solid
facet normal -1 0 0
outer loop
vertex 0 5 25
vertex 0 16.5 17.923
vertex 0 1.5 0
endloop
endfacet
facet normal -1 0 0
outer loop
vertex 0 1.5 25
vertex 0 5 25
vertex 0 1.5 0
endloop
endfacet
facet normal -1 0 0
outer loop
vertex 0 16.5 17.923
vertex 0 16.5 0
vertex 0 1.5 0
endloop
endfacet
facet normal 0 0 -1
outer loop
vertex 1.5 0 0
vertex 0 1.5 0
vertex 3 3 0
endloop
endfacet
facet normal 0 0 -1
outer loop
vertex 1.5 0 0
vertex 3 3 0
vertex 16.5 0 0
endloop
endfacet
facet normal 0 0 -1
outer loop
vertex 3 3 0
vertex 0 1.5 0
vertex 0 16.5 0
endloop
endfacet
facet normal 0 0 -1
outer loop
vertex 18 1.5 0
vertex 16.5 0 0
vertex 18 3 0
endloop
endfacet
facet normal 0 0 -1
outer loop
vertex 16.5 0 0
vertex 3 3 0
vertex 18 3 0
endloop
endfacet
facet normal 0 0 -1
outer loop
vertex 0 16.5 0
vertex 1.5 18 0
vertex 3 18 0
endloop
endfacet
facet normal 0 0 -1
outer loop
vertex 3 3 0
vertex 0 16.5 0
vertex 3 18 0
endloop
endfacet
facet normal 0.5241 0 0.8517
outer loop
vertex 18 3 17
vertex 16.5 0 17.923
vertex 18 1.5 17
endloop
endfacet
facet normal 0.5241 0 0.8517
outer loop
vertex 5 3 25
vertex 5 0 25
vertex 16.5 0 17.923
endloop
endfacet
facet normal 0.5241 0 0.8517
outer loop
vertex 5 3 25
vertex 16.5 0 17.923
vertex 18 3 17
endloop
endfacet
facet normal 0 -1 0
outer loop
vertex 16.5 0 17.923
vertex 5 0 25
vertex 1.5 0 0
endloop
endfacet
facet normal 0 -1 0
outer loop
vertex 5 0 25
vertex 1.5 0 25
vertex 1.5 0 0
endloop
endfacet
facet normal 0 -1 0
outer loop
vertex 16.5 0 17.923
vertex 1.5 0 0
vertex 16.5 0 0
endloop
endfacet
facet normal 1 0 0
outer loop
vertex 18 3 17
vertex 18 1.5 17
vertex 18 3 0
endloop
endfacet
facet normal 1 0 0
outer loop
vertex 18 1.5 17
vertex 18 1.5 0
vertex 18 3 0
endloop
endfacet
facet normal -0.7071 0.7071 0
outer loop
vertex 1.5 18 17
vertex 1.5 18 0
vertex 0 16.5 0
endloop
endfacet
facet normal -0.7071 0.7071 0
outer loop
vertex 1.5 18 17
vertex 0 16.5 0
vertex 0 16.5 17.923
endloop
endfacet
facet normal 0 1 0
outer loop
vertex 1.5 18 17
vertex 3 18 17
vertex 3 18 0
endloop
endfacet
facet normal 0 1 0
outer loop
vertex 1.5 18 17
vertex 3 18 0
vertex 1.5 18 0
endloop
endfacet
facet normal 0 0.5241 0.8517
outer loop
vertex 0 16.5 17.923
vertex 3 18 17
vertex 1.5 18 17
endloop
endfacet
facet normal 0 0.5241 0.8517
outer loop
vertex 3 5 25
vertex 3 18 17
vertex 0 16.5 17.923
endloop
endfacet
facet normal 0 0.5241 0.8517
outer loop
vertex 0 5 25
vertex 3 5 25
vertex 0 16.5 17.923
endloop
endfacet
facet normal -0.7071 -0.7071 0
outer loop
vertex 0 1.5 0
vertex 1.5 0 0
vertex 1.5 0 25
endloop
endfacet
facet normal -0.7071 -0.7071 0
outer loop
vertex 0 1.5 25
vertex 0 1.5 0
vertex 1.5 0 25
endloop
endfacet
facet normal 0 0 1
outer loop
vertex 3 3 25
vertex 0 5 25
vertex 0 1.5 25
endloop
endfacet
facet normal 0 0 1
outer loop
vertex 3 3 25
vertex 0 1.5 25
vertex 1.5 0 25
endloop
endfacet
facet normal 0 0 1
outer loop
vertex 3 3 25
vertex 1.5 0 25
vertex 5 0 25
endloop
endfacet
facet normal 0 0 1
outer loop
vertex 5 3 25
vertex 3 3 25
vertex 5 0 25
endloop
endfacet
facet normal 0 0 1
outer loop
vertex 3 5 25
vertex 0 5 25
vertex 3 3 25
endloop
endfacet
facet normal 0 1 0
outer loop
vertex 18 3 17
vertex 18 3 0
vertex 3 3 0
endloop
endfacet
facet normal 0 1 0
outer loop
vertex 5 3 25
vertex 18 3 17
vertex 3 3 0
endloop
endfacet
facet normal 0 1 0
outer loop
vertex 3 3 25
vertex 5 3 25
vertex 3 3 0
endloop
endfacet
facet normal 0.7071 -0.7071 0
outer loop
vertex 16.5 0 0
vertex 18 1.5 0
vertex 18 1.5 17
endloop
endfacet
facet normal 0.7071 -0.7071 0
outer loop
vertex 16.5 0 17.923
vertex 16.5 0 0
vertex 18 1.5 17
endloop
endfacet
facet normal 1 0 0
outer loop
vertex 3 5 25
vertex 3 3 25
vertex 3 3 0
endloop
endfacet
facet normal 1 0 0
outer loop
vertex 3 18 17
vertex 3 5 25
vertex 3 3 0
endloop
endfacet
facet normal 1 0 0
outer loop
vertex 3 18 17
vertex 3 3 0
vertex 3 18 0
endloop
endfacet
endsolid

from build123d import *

# Parameters (mm, degrees)
F1_DEPTH = 25
F2_SIZE2 = 13
F2_SIZE  = 8
F3_SIZE  = 1.5


with BuildPart() as f1:
    # F0 (on Top) → F1 (new body)
    with BuildSketch(Plane.XY):
        Polygon((0, 18), (0, 0), (18, 0), (18, 3), (3, 3), (3, 18), align=None)
    extrude(amount=F1_DEPTH)

    # F2
    f2_edges = [f1.edges().sort_by_distance(p)[0] for p in [
        (1.5, 18, 25),
        (18, 1.5, 25),
    ]]
    chamfer(f2_edges, length=F2_SIZE, length2=F2_SIZE2)

    # F3
    f3_edges = [f1.edges().sort_by_distance(p)[0] for p in [
        (0, 18, 8.5),
        (0, 0, 12.5),
        (18, 0, 8.5),
    ]]
    chamfer(f3_edges, length=F3_SIZE)


solid = f1.part
